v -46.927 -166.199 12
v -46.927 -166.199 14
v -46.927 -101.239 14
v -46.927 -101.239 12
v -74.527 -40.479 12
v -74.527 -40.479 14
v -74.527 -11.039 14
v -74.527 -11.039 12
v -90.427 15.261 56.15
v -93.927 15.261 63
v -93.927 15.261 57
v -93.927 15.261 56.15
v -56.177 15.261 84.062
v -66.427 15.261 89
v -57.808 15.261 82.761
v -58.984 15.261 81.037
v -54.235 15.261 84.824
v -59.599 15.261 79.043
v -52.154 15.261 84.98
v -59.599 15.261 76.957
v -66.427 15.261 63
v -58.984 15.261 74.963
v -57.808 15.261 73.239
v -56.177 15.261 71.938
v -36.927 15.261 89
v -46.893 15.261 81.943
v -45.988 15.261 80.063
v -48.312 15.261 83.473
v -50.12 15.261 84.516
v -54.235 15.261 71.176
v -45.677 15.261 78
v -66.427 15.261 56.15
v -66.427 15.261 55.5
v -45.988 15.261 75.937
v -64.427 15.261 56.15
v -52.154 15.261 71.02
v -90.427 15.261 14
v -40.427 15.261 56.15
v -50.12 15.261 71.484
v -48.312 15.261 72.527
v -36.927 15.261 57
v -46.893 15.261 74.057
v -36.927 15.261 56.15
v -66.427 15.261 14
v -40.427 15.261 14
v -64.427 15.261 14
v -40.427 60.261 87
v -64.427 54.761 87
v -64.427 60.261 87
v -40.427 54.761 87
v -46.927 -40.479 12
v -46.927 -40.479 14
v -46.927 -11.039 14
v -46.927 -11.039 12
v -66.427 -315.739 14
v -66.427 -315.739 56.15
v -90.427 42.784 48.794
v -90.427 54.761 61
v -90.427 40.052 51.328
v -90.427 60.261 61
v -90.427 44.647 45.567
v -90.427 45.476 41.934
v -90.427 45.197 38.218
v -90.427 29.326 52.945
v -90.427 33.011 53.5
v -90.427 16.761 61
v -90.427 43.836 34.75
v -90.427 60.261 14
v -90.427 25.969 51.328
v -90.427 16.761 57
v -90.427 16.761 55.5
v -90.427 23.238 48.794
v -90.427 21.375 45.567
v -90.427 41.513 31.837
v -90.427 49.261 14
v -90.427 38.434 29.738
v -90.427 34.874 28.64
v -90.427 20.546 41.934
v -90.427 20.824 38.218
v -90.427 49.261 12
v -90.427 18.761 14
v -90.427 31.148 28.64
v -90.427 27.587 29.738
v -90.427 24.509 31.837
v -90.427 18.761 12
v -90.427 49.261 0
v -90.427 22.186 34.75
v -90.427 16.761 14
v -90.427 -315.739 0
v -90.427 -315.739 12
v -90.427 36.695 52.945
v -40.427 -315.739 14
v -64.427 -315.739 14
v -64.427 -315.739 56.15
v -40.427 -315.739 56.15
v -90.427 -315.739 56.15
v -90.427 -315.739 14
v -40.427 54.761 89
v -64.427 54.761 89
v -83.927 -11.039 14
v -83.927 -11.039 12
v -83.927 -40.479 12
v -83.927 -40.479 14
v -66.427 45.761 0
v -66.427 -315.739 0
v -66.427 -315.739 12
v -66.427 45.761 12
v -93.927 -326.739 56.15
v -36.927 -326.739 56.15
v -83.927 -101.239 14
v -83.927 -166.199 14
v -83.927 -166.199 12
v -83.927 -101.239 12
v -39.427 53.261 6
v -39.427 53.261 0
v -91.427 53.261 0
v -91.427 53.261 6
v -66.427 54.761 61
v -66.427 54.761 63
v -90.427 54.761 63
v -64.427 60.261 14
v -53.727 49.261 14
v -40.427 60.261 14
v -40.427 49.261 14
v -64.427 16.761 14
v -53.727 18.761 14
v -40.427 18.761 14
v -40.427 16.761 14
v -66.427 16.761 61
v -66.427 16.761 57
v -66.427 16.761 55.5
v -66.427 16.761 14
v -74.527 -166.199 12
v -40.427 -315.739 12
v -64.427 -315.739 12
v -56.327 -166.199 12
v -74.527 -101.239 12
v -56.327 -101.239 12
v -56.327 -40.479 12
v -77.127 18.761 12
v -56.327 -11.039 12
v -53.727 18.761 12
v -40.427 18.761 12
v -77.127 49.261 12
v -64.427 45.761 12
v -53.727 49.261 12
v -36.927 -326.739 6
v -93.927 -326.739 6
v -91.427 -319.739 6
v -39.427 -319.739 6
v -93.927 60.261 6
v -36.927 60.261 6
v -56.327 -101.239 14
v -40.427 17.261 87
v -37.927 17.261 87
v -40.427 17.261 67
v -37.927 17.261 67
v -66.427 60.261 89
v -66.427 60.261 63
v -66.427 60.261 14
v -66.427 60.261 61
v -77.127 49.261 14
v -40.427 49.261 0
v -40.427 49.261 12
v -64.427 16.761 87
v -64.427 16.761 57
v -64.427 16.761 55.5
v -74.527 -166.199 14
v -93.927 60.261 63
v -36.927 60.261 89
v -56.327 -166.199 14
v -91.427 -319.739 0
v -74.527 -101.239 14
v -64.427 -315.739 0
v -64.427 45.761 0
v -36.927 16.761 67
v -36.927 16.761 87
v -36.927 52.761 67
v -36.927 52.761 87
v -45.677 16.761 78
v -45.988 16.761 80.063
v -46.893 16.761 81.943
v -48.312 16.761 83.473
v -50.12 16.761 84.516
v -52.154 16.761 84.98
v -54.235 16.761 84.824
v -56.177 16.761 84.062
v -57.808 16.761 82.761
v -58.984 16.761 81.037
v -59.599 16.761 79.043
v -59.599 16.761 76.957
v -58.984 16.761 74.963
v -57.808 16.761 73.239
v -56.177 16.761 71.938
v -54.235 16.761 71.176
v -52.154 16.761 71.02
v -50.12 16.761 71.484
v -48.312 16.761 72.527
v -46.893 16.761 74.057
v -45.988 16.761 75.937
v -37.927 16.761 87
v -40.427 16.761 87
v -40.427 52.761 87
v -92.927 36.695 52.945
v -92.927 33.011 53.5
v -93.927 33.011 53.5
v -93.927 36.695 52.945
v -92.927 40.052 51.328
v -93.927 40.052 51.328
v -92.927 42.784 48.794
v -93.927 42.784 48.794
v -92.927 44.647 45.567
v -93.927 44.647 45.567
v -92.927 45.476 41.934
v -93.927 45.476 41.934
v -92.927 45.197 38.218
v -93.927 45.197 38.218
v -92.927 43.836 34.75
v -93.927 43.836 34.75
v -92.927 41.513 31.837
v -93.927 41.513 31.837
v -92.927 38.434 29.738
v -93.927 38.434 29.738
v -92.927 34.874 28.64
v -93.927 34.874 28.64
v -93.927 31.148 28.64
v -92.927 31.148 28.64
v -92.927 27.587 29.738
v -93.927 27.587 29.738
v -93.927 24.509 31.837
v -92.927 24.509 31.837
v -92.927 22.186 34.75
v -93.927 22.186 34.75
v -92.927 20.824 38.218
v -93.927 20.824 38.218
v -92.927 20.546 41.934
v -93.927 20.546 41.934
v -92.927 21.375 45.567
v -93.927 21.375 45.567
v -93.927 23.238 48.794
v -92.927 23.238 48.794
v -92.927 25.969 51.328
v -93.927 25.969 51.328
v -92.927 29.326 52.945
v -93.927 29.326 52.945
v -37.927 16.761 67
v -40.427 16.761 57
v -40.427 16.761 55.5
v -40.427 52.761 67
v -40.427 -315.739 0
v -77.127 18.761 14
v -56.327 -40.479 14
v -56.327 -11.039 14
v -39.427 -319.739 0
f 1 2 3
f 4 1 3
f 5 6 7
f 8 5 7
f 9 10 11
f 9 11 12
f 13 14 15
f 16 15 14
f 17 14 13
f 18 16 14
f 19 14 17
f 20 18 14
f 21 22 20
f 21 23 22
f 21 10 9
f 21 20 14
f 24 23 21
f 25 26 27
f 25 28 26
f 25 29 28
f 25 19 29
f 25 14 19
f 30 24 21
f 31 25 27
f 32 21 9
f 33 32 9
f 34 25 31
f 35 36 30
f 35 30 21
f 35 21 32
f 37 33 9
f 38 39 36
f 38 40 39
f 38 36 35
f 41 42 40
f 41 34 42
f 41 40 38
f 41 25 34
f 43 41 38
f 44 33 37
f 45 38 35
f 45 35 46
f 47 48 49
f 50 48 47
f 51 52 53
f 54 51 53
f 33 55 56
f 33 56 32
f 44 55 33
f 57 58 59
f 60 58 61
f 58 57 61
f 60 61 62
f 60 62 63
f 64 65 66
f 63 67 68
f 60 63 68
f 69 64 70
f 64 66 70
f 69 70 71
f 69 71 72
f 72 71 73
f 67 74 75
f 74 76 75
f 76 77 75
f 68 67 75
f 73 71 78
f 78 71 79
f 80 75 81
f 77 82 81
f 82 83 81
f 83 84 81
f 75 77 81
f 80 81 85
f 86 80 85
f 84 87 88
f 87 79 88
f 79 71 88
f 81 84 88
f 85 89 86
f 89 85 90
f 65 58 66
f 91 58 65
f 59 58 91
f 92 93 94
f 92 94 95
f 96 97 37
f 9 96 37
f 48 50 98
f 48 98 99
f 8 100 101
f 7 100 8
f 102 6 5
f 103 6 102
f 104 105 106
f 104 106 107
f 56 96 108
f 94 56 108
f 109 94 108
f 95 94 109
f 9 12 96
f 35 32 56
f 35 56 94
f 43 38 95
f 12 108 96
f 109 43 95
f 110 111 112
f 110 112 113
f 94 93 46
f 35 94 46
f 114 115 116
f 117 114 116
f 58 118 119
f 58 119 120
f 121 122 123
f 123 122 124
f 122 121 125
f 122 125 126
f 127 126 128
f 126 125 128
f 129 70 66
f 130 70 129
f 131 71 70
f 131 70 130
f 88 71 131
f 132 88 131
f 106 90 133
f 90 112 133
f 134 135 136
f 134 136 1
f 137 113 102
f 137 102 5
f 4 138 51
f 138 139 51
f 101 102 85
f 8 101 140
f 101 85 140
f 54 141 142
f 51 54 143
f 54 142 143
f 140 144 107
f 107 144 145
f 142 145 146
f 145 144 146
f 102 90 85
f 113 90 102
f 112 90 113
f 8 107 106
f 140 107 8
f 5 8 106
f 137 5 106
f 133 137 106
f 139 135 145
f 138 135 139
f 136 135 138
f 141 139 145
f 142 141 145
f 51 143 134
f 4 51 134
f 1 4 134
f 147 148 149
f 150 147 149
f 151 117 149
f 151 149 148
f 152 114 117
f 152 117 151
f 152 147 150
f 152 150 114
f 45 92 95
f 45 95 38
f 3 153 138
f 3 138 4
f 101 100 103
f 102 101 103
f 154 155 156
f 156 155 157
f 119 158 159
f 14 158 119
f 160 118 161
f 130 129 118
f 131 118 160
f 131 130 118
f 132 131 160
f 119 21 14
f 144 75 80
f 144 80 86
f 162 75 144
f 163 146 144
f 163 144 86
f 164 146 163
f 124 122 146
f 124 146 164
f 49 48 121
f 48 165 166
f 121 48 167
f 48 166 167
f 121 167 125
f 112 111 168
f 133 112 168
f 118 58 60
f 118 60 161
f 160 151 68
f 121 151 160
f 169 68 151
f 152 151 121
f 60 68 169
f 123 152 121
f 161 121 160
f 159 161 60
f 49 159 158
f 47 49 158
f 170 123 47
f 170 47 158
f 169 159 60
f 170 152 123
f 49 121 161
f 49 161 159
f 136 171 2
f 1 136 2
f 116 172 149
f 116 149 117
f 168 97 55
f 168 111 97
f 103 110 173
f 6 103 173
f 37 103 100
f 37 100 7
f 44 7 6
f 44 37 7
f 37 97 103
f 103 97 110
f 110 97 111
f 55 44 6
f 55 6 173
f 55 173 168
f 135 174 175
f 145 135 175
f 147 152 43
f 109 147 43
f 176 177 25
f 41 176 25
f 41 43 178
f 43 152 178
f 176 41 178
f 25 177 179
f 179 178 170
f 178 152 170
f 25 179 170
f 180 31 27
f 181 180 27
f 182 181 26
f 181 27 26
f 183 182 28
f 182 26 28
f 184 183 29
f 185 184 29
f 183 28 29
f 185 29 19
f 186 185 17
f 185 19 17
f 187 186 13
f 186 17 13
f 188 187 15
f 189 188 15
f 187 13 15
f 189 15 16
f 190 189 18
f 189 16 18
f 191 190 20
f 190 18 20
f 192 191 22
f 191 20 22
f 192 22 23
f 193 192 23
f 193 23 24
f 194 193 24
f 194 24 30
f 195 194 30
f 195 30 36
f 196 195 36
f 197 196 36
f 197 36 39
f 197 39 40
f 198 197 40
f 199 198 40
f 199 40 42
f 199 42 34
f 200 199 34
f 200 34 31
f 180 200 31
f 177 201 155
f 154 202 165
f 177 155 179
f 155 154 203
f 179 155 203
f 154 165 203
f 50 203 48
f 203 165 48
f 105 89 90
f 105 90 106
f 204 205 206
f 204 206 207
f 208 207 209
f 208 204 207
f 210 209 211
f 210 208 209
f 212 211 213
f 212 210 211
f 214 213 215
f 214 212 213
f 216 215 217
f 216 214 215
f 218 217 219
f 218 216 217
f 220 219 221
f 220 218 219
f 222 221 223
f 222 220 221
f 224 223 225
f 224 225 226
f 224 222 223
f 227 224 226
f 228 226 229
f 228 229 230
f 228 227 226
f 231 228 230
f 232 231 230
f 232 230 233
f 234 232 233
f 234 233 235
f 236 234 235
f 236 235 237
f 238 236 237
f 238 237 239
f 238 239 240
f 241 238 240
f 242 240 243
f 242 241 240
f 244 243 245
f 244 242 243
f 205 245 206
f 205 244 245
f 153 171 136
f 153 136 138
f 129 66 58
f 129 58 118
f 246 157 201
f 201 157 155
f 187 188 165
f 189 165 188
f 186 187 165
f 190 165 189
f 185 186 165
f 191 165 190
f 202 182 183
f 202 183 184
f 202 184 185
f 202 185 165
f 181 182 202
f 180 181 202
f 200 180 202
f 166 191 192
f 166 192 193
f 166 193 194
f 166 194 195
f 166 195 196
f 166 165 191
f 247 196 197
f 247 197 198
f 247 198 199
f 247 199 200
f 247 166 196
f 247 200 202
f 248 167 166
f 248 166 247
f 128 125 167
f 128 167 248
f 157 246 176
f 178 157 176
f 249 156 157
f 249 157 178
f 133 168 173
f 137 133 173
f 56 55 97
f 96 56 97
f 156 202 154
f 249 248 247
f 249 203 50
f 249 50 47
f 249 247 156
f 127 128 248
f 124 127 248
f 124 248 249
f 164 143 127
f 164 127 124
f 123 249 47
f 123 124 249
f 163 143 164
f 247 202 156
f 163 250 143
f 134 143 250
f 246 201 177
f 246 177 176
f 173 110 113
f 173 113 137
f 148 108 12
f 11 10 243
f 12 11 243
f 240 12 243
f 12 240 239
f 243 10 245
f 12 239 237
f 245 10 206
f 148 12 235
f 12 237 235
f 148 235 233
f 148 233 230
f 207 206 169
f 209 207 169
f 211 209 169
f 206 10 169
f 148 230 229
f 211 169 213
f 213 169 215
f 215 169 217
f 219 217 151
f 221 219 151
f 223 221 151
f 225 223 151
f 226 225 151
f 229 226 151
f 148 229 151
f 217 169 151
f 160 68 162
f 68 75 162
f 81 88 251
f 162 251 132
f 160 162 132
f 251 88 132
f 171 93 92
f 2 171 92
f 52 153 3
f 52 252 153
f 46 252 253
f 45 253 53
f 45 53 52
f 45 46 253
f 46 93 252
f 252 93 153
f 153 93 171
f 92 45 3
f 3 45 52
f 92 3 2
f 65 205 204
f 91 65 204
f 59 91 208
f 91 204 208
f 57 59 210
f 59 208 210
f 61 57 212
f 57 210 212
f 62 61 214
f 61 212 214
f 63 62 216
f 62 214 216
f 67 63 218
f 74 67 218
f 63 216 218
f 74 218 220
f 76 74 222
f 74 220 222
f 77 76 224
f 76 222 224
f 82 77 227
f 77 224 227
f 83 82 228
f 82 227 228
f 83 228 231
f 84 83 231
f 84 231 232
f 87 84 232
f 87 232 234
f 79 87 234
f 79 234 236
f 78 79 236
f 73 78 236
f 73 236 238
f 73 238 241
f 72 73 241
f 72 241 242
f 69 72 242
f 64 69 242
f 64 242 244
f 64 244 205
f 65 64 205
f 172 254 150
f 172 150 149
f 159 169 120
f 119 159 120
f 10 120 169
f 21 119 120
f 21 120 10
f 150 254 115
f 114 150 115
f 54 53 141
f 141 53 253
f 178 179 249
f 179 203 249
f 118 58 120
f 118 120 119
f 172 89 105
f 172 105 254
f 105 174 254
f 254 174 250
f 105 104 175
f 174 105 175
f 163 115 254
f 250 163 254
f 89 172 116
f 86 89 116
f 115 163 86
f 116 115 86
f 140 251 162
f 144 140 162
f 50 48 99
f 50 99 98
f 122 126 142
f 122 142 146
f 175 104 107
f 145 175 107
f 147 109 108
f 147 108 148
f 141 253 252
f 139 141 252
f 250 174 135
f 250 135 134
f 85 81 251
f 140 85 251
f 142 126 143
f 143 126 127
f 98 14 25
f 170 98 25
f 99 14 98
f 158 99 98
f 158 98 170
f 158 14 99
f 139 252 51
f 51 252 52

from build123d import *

# Parameters (mm, degrees)
SZKIC1_W                     = 53
SZKIC1_H                     = 374
SZKIC1_W_2                   = 24
SZKIC1_H_2                   = 365
DODANIE_WYCI_GNI_CIE2_DEPTH  = 12
SZKIC2_W                     = 12
SZKIC2_H                     = 3.5
WYTNIJ_WYCI_GNI_CIE1_DEPTH   = 2
SZKIC3_W                     = 53
SZKIC3_H                     = 374
DODANIE_WYCI_GNI_CIE3_DEPTH  = 2
SZKIC4_W                     = 13.3
SZKIC4_H                     = 30.500081729
SZKIC4_W_2                   = 9.4
SZKIC4_H_2                   = 64.96
WYTNIJ_WYCI_GNI_CIE2_DEPTH   = 2
SZKIC5_W                     = 2
SZKIC5_H                     = 374
DODANIE_WYCI_GNI_CIE4_DEPTH  = 43
DODANIE_WYCI_GNI_CIE5_DEPTH  = 41.5
SZKIC7_W                     = 25.5
SZKIC7_H                     = 38.500081729
DODANIE_WYCI_GNI_CIE6_DEPTH  = 1.5
DODANIE_WYCI_GNI_CIE7_DEPTH  = 43
DODANIE_WYCI_GNI_CIE8_DEPTH  = 43
SZKIC15_W                    = 57
SZKIC15_H                    = 374
DODANIE_WYCI_GNI_CIE10_DEPTH = 1
SZKIC16_W                    = 57
SZKIC16_H                    = 374
DODANIE_WYCI_GNI_CIE11_DEPTH = 1
SZKIC17_W                    = 55
SZKIC17_H                    = 57
SZKIC17_W_2                  = 24
SZKIC17_H_2                  = 41.5
DODANIE_WYCI_GNI_CIE12_DEPTH = 1
SZKIC18_W                    = 55
SZKIC18_H                    = 57
DODANIE_WYCI_GNI_CIE13_DEPTH = 1
SZKIC19_W                    = 55
SZKIC19_H                    = 376
SZKIC19_W_2                  = 52
SZKIC19_H_2                  = 373
WYTNIJ_WYCI_GNI_CIE7_DEPTH   = 6
SZKIC23_W                    = 24
SZKIC23_H                    = 38.000081729
WYTNIJ_WYCI_GNI_CIE11_DEPTH  = 10
DODANIE_WYCI_GNI_CIE14_DEPTH = 32
SZKIC25_W                    = 24
SZKIC25_H                    = 2
DODANIE_WYCI_GNI_CIE15_DEPTH = 38
SZKIC27_R                    = 7
WYTNIJ_WYCI_GNI_CIE12_DEPTH  = 10
SZKIC29_W                    = 20
SZKIC29_H                    = 35.5
WYTNIJ_WYCI_GNI_CIE13_DEPTH  = 3
DODANIE_WYCI_GNI_CIE16_DEPTH = 6
SZKIC31_W                    = 24
SZKIC31_H                    = 2
DODANIE_WYCI_GNI_CIE17_DEPTH = 38
SZKIC32_R                    = 12.5
WYTNIJ_WYCI_GNI_CIE14_DEPTH  = 3
SZKIC33_W                    = 24
SZKIC33_H                    = 73
SZKIC33_H_2                  = 47
DODANIE_WYCI_GNI_CIE18_DEPTH = 5.5
SZKIC34_W                    = 55
SZKIC34_H                    = 51
DODANIE_WYCI_GNI_CIE19_DEPTH = 5.5
SZKIC35_W                    = 20
SZKIC35_H                    = 36
DODANIE_WYCI_GNI_CIE20_DEPTH = 1
SZKIC36_R                    = 12.5
DODANIE_WYCI_GNI_CIE21_DEPTH = 1
SZKIC37_W                    = 57
SZKIC37_H                    = 341.999918271
WYTNIJ_WYCI_GNI_CIE15_DEPTH  = 0.85


with BuildPart() as part:
    # Szkic1 → Dodanie-wyciągnięcie2 (new body)
    with BuildSketch(Plane.XY):
        with Locations((-65.426891924, -133.239080048)):
            Rectangle(SZKIC1_W, SZKIC1_H)
        with Locations((-78.426891924, -133.239080048)):
            Rectangle(SZKIC1_W_2, SZKIC1_H_2, mode=Mode.SUBTRACT)
        with Locations((-52.426891924, -133.239080048)):
            Rectangle(SZKIC1_W_2, SZKIC1_H_2, mode=Mode.SUBTRACT)
    extrude(amount=DODANIE_WYCI_GNI_CIE2_DEPTH)

    # Szkic2 → Wytnij-wyciągnięcie1 (cut)
    with BuildSketch(Plane.ZY.offset(66.426891924)):
        with Locations((6, 47.510919952)):
            Rectangle(SZKIC2_W, SZKIC2_H)
    extrude(amount=-WYTNIJ_WYCI_GNI_CIE1_DEPTH, mode=Mode.SUBTRACT)

    # Szkic3 → Dodanie-wyciągnięcie3 (add)
    with BuildSketch(Plane.XY.offset(12)):
        with Locations((-65.426891924, -133.239080048)):
            Rectangle(SZKIC3_W, SZKIC3_H)
    extrude(amount=DODANIE_WYCI_GNI_CIE3_DEPTH)

    # Szkic4 → Wytnij-wyciągnięcie2 (cut)
    with BuildSketch(Plane.XY.offset(14)):
        Polygon((-46.926891924, -11.039080048), (-56.326891924, -11.039080048), (-56.326891924, -35.399080048), (-56.326891924, -40.479080048), (-46.926891924, -40.479080048), (-46.926891924, -35.399080048), align=None)
        with Locations((-47.076891924, 34.010879088)):
            Rectangle(SZKIC4_W, SZKIC4_H)
        with Locations((-83.776891924, 34.010879088)):
            Rectangle(SZKIC4_W, SZKIC4_H)
        Polygon((-74.526891924, -35.399080048), (-74.526891924, -40.479080048), (-83.926891924, -40.479080048), (-83.926891924, -35.399080048), (-83.926891924, -11.039080048), (-74.526891924, -11.039080048), align=None)
        with Locations((-51.626891924, -133.719080048)):
            Rectangle(SZKIC4_W_2, SZKIC4_H_2)
        with Locations((-79.226891924, -133.719080048)):
            Rectangle(SZKIC4_W_2, SZKIC4_H_2)
    extrude(amount=-WYTNIJ_WYCI_GNI_CIE2_DEPTH, mode=Mode.SUBTRACT)

    # Szkic5 → Dodanie-wyciągnięcie4 (add)
    with BuildSketch(Plane.XY.offset(14)):
        with Locations((-65.426891924, -133.239080048)):
            Rectangle(SZKIC5_W, SZKIC5_H)
    extrude(amount=DODANIE_WYCI_GNI_CIE4_DEPTH)

    # Szkic6 → Dodanie-wyciągnięcie5 (add)
    with BuildSketch(Plane.XY.offset(14)):
        Polygon((-64.426891924, 16.760838223), (-40.426891924, 16.760838223), (-40.426891924, 53.760919952), (-38.926891924, 53.760919952), (-38.926891924, 15.260838223), (-64.426891924, 15.260838223), align=None)
        Polygon((-90.426891924, 53.760919952), (-91.926891924, 53.760919952), (-91.926891924, 15.260838223), (-66.426891924, 15.260838223), (-66.426891924, 16.760838223), (-90.426891924, 16.760838223), align=None)
    extrude(amount=DODANIE_WYCI_GNI_CIE5_DEPTH)

    # Szkic7 → Dodanie-wyciągnięcie6 (add)
    with BuildSketch(Plane.XY.offset(55.5)):
        with Locations((-51.676891924, 34.510879088)):
            Rectangle(SZKIC7_W, SZKIC7_H)
        with Locations((-79.176891924, 34.510879088)):
            Rectangle(SZKIC7_W, SZKIC7_H)
    extrude(amount=DODANIE_WYCI_GNI_CIE6_DEPTH)

    # Szkic10 → Dodanie-wyciągnięcie7 (add)
    with BuildSketch(Plane.XY.offset(14)):
        Polygon((-91.926891924, 15.260838223), (-91.926891924, -320.239080048), (-66.426891924, -320.239080048), (-66.426891924, -315.739080048), (-90.426891924, -315.739080048), (-90.426891924, 15.260838223), align=None)
    extrude(amount=DODANIE_WYCI_GNI_CIE7_DEPTH)

    # Szkic11 → Dodanie-wyciągnięcie8 (add)
    with BuildSketch(Plane.XY.offset(14)):
        Polygon((-38.926891924, 15.260838223), (-38.926891924, -320.239080048), (-64.426891924, -320.239080048), (-64.426891924, -315.739080048), (-40.426891924, -315.739080048), (-40.426891924, 15.260838223), align=None)
    extrude(amount=DODANIE_WYCI_GNI_CIE8_DEPTH)

    # Szkic15 → Dodanie-wyciągnięcie10 (add)
    with BuildSketch(Plane.ZY.offset(91.926891924)):
        with Locations((28.5, -133.239080048)):
            Rectangle(SZKIC15_W, SZKIC15_H)
    extrude(amount=DODANIE_WYCI_GNI_CIE10_DEPTH)

    # Szkic16 → Dodanie-wyciągnięcie11 (add)
    with BuildSketch(Plane(origin=(-38.926891924, 0, 0), x_dir=(0, 0, -1), z_dir=(1, 0, 0))):
        with Locations((-28.5, -133.239080048)):
            Rectangle(SZKIC16_W, SZKIC16_H)
    extrude(amount=DODANIE_WYCI_GNI_CIE11_DEPTH)

    # Szkic17 → Dodanie-wyciągnięcie12 (add)
    with BuildSketch(Plane(origin=(0, 53.760919952, 0), x_dir=(1, 0, 0), z_dir=(0, 1, 0))):
        with Locations((-65.426891924, -28.5)):
            Rectangle(SZKIC17_W, SZKIC17_H)
        with Locations((-52.426891924, -34.75)):
            Rectangle(SZKIC17_W_2, SZKIC17_H_2, mode=Mode.SUBTRACT)
        with Locations((-78.426891924, -34.75)):
            Rectangle(SZKIC17_W_2, SZKIC17_H_2, mode=Mode.SUBTRACT)
    extrude(amount=DODANIE_WYCI_GNI_CIE12_DEPTH)

    # Szkic18 → Dodanie-wyciągnięcie13 (add)
    with BuildSketch(Plane.XZ.offset(320.239080048)):
        with Locations((-65.426891924, 28.5)):
            Rectangle(SZKIC18_W, SZKIC18_H)
    extrude(amount=DODANIE_WYCI_GNI_CIE13_DEPTH)

    # Szkic19 → Wytnij-wyciągnięcie7 (cut)
    with BuildSketch(Plane(origin=(0, 0, 0), x_dir=(-1, 0, 0), z_dir=(0, 0, -1))):
        with Locations((65.426891924, -133.239080048)):
            Rectangle(SZKIC19_W, SZKIC19_H)
        with Locations((65.426891924, -133.239080048)):
            Rectangle(SZKIC19_W_2, SZKIC19_H_2, mode=Mode.SUBTRACT)
    extrude(amount=-WYTNIJ_WYCI_GNI_CIE7_DEPTH, mode=Mode.SUBTRACT)

    # Szkic23 → Wytnij-wyciągnięcie11 (cut)
    with BuildSketch(Plane.XY.offset(57)):
        with Locations((-52.426891924, 35.760879088)):
            Rectangle(SZKIC23_W, SZKIC23_H)
        with Locations((-78.426891924, 35.760879088)):
            Rectangle(SZKIC23_W, SZKIC23_H)
    extrude(amount=-WYTNIJ_WYCI_GNI_CIE11_DEPTH, mode=Mode.SUBTRACT)

    # Szkic24 → Dodanie-wyciągnięcie14 (add)
    with BuildSketch(Plane.XY.offset(57)):
        Polygon((-40.426891924, 54.760919952), (-37.926891924, 54.760919952), (-37.926891924, 15.260838223), (-66.426891924, 15.260838223), (-66.426891924, 16.760838223), (-66.426891924, 54.760919952), (-64.426891924, 54.760919952), (-64.426891924, 16.760838223), (-40.426891924, 16.760838223), align=None)
    extrude(amount=DODANIE_WYCI_GNI_CIE14_DEPTH)

    # Szkic25 → Dodanie-wyciągnięcie15 (add)
    with BuildSketch(Plane(origin=(0, 16.760838223, 0), x_dir=(1, 0, 0), z_dir=(0, 1, 0))):
        with Locations((-52.426891924, -88)):
            Rectangle(SZKIC25_W, SZKIC25_H)
    extrude(amount=DODANIE_WYCI_GNI_CIE15_DEPTH)

    # Szkic27 → Wytnij-wyciągnięcie12 (cut)
    with BuildSketch(Plane.XZ.offset(-15.260838223)):
        with Locations((-52.676891924, 78)):
            Circle(SZKIC27_R)
    extrude(amount=-WYTNIJ_WYCI_GNI_CIE12_DEPTH, mode=Mode.SUBTRACT)

    # Szkic29 → Wytnij-wyciągnięcie13 (cut)
    with BuildSketch(Plane(origin=(-37.926891924, 0, 0), x_dir=(0, 0, -1), z_dir=(1, 0, 0))):
        with Locations((-77, 35.010838223)):
            Rectangle(SZKIC29_W, SZKIC29_H)
    extrude(amount=-WYTNIJ_WYCI_GNI_CIE13_DEPTH, mode=Mode.SUBTRACT)

    # Szkic30 → Dodanie-wyciągnięcie16 (add)
    with BuildSketch(Plane.XY.offset(57)):
        Polygon((-66.426891924, 16.760838223), (-66.426891924, 15.260838223), (-92.926891924, 15.260838223), (-92.926891924, 54.760919952), (-90.426891924, 54.760919952), (-90.426891924, 16.760838223), align=None)
    extrude(amount=DODANIE_WYCI_GNI_CIE16_DEPTH)

    # Szkic31 → Dodanie-wyciągnięcie17 (add)
    with BuildSketch(Plane(origin=(0, 16.760838223, 0), x_dir=(1, 0, 0), z_dir=(0, 1, 0))):
        with Locations((-78.426891924, -62)):
            Rectangle(SZKIC31_W, SZKIC31_H)
    extrude(amount=DODANIE_WYCI_GNI_CIE17_DEPTH)

    # Szkic32 → Wytnij-wyciągnięcie14 (cut)
    with BuildSketch(Plane.ZY.offset(92.926891924)):
        with Locations((41, 33.010879088)):
            Circle(SZKIC32_R)
    extrude(amount=-WYTNIJ_WYCI_GNI_CIE14_DEPTH, mode=Mode.SUBTRACT)

    # Szkic33 → Dodanie-wyciągnięcie18 (add)
    with BuildSketch(Plane(origin=(0, 54.760919952, 0), x_dir=(1, 0, 0), z_dir=(0, 1, 0))):
        Polygon((-37.926891924, -89), (-66.426891924, -89), (-66.426891924, -63), (-92.926891924, -63), (-92.926891924, -6), (-37.926891924, -6), align=None)
        with Locations((-52.426891924, -50.5)):
            Rectangle(SZKIC33_W, SZKIC33_H, mode=Mode.SUBTRACT)
        with Locations((-78.426891924, -37.5)):
            Rectangle(SZKIC33_W, SZKIC33_H_2, mode=Mode.SUBTRACT)
    extrude(amount=DODANIE_WYCI_GNI_CIE18_DEPTH)

    # Szkic34 → Dodanie-wyciągnięcie19 (add)
    with BuildSketch(Plane.XZ.offset(321.239080048)):
        with Locations((-65.426891924, 31.5)):
            Rectangle(SZKIC34_W, SZKIC34_H)
    extrude(amount=DODANIE_WYCI_GNI_CIE19_DEPTH)

    # Szkic35 → Dodanie-wyciągnięcie20 (add)
    with BuildSketch(Plane(origin=(-37.926891924, 0, 0), x_dir=(0, 0, -1), z_dir=(1, 0, 0))):
        Polygon((-57, -326.739080048), (-57, 15.260838223), (-89, 15.260838223), (-89, 60.260919952), (-6, 60.260919952), (-6, -326.739080048), align=None)
        with Locations((-77, 34.760838223)):
            Rectangle(SZKIC35_W, SZKIC35_H, mode=Mode.SUBTRACT)
    extrude(amount=DODANIE_WYCI_GNI_CIE20_DEPTH)

    # Szkic36 → Dodanie-wyciągnięcie21 (add)
    with BuildSketch(Plane.ZY.offset(92.926891924)):
        Polygon((63, 60.260919952), (63, 15.260838223), (57, 15.260838223), (57, -326.739080048), (6, -326.739080048), (6, 60.260919952), align=None)
        with Locations((41, 33.010879088)):
            Circle(SZKIC36_R, mode=Mode.SUBTRACT)
    extrude(amount=DODANIE_WYCI_GNI_CIE21_DEPTH)

    # Szkic37 → Wytnij-wyciągnięcie15 (cut)
    with BuildSketch(Plane.XY.offset(57)):
        with Locations((-65.426891924, -155.739120912)):
            Rectangle(SZKIC37_W, SZKIC37_H)
    extrude(amount=-WYTNIJ_WYCI_GNI_CIE15_DEPTH, mode=Mode.SUBTRACT)


solid = part.part
